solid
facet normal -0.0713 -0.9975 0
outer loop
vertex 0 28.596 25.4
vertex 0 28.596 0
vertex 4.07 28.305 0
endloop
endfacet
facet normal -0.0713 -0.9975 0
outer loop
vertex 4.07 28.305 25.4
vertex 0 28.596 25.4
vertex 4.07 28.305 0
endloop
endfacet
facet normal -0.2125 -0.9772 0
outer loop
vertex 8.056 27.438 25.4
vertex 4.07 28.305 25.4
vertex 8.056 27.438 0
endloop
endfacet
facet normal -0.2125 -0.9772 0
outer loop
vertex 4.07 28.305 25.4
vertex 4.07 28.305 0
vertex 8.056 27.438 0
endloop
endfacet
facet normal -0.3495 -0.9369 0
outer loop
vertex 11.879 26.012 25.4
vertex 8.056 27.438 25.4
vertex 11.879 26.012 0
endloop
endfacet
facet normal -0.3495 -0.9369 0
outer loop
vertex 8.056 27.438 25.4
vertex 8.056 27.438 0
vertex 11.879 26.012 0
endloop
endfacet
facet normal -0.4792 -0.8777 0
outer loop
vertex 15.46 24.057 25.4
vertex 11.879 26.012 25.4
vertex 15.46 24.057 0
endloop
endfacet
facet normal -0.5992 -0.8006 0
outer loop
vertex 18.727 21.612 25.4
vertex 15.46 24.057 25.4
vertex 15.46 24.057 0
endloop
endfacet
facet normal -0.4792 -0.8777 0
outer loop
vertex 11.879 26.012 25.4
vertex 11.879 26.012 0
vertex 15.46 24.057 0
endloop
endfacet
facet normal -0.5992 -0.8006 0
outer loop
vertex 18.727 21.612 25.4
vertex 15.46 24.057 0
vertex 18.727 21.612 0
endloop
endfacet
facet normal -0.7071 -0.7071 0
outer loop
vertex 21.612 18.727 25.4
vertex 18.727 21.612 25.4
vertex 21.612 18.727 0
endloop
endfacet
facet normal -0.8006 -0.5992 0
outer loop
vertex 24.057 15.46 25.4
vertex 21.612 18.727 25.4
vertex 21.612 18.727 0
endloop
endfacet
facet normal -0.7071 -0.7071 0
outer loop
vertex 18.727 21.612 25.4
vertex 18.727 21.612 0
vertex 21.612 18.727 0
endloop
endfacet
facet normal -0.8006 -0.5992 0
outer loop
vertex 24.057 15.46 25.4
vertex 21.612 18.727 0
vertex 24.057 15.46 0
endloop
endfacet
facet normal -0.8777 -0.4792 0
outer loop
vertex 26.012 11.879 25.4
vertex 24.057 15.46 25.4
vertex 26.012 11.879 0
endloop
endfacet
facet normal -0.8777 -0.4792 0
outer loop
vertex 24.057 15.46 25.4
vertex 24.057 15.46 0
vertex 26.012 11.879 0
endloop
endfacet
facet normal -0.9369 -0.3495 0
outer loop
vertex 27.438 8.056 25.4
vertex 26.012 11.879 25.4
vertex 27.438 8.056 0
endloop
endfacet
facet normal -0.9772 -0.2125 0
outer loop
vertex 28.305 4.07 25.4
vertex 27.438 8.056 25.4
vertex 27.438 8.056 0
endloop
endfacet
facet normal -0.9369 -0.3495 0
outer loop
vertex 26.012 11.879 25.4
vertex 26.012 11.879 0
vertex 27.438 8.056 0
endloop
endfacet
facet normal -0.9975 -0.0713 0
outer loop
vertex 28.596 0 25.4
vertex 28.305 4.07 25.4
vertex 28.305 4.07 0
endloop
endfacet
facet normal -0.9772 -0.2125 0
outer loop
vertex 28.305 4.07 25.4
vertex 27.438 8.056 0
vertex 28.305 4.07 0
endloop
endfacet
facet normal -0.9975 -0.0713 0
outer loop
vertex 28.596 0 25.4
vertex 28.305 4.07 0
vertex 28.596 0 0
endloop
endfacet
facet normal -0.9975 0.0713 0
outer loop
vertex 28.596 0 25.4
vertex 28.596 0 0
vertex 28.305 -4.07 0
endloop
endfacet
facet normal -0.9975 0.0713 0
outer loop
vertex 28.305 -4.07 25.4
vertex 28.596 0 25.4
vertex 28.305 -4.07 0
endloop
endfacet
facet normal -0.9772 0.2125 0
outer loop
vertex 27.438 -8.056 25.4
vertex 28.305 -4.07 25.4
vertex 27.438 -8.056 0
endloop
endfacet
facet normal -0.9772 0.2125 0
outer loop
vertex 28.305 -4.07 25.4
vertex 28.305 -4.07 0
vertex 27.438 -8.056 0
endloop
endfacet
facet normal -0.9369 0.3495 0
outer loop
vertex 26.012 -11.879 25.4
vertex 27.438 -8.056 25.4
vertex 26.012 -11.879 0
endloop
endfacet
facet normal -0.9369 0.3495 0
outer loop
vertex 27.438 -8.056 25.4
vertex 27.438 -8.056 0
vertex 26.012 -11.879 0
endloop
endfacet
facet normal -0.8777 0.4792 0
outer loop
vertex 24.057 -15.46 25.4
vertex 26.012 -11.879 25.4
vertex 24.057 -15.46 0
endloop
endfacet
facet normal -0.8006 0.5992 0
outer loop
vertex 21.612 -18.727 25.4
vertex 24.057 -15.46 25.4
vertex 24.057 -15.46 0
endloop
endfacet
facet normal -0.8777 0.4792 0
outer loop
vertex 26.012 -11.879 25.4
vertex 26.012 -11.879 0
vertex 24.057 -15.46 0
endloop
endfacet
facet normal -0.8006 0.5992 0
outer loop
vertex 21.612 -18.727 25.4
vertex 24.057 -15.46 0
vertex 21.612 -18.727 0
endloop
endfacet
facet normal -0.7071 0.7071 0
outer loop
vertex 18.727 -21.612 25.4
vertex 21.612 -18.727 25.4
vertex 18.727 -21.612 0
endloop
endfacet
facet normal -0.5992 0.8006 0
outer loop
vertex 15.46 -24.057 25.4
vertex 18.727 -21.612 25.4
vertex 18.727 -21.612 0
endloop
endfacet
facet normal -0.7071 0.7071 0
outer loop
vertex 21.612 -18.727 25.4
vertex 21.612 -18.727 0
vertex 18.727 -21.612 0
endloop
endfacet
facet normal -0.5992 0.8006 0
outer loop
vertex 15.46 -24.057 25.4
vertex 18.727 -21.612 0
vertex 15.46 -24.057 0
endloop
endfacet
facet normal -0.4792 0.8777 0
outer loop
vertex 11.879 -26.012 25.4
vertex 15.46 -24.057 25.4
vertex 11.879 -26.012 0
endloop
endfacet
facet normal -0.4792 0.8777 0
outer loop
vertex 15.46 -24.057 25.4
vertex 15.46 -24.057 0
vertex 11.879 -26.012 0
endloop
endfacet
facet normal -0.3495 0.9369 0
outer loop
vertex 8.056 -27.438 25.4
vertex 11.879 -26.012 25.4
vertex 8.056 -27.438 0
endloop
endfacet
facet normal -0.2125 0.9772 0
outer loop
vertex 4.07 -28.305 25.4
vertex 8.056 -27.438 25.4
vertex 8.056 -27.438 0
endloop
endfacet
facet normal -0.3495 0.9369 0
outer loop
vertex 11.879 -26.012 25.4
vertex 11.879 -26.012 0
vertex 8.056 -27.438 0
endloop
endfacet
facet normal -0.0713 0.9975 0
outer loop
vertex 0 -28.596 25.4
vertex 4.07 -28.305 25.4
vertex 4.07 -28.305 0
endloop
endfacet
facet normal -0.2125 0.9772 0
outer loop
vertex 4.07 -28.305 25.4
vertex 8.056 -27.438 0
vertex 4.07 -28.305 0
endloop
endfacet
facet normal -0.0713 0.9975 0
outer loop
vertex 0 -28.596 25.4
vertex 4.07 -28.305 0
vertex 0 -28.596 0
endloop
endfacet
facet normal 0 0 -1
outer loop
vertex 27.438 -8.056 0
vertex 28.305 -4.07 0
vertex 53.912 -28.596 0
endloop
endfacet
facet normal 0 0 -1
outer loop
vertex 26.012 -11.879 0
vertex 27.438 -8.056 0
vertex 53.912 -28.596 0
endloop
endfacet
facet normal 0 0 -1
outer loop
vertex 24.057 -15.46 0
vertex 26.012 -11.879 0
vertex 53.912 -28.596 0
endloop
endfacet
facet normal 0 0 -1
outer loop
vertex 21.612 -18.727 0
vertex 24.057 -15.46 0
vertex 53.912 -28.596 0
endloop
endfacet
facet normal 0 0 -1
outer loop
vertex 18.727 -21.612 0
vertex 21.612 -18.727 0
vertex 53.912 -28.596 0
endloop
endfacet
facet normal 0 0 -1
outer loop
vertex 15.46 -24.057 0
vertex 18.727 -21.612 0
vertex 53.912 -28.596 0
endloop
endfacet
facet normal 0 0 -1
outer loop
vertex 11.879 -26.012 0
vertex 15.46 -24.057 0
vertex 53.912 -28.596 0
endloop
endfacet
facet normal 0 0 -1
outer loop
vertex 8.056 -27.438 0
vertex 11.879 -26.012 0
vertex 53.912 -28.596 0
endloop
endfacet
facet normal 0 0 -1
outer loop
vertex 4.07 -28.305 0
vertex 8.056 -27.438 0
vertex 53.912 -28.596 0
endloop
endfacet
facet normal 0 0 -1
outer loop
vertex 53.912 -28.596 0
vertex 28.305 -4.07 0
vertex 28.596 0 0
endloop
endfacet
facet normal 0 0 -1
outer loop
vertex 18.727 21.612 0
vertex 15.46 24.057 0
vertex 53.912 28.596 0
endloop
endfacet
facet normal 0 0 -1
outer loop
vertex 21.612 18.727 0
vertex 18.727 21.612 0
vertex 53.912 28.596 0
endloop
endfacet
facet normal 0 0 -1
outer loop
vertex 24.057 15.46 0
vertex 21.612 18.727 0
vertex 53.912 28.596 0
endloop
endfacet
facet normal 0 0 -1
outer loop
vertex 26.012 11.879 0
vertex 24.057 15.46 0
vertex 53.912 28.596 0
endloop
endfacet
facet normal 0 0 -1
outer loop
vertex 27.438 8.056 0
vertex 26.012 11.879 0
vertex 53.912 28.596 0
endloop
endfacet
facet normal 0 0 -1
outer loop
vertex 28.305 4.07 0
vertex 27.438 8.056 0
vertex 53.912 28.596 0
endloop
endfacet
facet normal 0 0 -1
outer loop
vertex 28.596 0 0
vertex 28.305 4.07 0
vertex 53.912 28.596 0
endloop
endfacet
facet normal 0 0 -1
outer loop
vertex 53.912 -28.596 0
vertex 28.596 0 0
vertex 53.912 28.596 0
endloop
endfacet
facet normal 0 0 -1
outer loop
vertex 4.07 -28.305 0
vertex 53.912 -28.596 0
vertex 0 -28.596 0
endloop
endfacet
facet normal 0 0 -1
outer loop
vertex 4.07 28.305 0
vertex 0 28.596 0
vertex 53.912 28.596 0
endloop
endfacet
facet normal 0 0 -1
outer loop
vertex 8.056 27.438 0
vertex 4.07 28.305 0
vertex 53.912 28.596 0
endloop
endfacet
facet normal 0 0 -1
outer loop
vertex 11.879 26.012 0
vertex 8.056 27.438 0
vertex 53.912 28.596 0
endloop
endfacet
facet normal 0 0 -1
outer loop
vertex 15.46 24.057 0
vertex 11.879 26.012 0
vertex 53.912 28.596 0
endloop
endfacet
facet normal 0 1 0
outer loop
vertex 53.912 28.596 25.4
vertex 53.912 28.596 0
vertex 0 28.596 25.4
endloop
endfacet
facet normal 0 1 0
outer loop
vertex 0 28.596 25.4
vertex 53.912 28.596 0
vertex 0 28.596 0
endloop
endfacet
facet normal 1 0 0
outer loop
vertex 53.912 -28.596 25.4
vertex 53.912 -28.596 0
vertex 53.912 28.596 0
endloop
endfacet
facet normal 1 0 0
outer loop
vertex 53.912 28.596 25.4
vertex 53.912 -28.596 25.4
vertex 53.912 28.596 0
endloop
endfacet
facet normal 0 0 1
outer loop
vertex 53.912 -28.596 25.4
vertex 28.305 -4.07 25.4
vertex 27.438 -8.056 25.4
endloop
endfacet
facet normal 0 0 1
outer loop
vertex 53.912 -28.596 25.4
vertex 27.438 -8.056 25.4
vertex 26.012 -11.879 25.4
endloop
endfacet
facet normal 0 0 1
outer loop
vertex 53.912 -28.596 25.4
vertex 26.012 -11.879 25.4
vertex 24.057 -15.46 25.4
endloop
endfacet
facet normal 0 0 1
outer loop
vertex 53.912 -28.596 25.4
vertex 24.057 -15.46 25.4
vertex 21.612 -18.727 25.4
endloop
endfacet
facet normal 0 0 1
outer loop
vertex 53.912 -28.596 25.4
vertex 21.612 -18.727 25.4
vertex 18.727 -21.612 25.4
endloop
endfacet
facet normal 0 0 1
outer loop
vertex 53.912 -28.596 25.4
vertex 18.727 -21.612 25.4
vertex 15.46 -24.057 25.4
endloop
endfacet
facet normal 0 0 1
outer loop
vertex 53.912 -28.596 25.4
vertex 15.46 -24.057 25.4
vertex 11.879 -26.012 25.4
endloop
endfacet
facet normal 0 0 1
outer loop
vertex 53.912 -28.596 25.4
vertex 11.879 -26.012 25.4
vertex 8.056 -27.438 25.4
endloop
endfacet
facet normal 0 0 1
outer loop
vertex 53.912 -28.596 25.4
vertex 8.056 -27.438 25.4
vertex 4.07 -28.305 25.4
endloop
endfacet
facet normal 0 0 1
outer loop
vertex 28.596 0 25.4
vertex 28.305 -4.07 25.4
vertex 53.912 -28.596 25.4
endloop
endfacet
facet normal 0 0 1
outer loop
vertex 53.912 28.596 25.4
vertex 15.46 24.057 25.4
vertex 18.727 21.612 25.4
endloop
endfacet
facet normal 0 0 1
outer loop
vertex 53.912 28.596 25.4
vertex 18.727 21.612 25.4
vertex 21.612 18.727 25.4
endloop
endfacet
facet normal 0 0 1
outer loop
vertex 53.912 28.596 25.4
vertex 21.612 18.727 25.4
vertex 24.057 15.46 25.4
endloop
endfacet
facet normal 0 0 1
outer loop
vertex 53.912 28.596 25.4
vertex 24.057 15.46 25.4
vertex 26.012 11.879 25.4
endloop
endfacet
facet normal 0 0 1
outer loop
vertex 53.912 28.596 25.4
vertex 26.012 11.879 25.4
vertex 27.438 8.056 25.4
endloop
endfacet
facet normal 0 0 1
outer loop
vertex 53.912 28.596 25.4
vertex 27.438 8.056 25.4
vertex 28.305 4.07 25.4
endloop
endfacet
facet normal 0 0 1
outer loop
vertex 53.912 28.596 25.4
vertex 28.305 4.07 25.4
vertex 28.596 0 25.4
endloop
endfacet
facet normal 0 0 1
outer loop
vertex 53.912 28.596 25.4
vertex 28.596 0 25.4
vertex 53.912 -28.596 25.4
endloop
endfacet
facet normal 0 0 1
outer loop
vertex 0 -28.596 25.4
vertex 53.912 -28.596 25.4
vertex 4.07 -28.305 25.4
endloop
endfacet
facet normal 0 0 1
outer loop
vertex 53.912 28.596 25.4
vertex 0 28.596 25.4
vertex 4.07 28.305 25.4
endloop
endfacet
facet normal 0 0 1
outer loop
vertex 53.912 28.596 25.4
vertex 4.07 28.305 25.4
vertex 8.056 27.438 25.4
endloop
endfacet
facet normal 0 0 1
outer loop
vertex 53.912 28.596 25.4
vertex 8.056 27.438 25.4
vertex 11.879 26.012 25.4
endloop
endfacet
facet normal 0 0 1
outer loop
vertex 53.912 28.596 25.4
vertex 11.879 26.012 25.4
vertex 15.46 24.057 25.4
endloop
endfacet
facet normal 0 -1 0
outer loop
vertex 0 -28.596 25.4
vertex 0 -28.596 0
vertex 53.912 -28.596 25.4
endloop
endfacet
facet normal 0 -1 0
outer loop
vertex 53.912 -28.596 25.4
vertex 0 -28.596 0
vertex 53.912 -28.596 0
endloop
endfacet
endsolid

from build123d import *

# Parameters (mm, degrees)
F1_DEPTH = 25.4


with BuildPart() as f1:
    # F0 (on Top) → F1 (new body)
    with BuildSketch(Plane.XY):
        with BuildLine():
            ThreePointArc((0, 28.596171), (20.220547, 20.220547), (28.596171, 0))
            ThreePointArc((28.596171, 0), (20.220547, -20.220547), (0, -28.596171))
            Line((0, -28.596171), (53.911736, -28.596171))
            Line((53.911736, -28.596171), (53.911736, 28.596171))
            Line((53.911736, 28.596171), (0, 28.596171))
        make_face()
    extrude(amount=F1_DEPTH)


solid = f1.part
